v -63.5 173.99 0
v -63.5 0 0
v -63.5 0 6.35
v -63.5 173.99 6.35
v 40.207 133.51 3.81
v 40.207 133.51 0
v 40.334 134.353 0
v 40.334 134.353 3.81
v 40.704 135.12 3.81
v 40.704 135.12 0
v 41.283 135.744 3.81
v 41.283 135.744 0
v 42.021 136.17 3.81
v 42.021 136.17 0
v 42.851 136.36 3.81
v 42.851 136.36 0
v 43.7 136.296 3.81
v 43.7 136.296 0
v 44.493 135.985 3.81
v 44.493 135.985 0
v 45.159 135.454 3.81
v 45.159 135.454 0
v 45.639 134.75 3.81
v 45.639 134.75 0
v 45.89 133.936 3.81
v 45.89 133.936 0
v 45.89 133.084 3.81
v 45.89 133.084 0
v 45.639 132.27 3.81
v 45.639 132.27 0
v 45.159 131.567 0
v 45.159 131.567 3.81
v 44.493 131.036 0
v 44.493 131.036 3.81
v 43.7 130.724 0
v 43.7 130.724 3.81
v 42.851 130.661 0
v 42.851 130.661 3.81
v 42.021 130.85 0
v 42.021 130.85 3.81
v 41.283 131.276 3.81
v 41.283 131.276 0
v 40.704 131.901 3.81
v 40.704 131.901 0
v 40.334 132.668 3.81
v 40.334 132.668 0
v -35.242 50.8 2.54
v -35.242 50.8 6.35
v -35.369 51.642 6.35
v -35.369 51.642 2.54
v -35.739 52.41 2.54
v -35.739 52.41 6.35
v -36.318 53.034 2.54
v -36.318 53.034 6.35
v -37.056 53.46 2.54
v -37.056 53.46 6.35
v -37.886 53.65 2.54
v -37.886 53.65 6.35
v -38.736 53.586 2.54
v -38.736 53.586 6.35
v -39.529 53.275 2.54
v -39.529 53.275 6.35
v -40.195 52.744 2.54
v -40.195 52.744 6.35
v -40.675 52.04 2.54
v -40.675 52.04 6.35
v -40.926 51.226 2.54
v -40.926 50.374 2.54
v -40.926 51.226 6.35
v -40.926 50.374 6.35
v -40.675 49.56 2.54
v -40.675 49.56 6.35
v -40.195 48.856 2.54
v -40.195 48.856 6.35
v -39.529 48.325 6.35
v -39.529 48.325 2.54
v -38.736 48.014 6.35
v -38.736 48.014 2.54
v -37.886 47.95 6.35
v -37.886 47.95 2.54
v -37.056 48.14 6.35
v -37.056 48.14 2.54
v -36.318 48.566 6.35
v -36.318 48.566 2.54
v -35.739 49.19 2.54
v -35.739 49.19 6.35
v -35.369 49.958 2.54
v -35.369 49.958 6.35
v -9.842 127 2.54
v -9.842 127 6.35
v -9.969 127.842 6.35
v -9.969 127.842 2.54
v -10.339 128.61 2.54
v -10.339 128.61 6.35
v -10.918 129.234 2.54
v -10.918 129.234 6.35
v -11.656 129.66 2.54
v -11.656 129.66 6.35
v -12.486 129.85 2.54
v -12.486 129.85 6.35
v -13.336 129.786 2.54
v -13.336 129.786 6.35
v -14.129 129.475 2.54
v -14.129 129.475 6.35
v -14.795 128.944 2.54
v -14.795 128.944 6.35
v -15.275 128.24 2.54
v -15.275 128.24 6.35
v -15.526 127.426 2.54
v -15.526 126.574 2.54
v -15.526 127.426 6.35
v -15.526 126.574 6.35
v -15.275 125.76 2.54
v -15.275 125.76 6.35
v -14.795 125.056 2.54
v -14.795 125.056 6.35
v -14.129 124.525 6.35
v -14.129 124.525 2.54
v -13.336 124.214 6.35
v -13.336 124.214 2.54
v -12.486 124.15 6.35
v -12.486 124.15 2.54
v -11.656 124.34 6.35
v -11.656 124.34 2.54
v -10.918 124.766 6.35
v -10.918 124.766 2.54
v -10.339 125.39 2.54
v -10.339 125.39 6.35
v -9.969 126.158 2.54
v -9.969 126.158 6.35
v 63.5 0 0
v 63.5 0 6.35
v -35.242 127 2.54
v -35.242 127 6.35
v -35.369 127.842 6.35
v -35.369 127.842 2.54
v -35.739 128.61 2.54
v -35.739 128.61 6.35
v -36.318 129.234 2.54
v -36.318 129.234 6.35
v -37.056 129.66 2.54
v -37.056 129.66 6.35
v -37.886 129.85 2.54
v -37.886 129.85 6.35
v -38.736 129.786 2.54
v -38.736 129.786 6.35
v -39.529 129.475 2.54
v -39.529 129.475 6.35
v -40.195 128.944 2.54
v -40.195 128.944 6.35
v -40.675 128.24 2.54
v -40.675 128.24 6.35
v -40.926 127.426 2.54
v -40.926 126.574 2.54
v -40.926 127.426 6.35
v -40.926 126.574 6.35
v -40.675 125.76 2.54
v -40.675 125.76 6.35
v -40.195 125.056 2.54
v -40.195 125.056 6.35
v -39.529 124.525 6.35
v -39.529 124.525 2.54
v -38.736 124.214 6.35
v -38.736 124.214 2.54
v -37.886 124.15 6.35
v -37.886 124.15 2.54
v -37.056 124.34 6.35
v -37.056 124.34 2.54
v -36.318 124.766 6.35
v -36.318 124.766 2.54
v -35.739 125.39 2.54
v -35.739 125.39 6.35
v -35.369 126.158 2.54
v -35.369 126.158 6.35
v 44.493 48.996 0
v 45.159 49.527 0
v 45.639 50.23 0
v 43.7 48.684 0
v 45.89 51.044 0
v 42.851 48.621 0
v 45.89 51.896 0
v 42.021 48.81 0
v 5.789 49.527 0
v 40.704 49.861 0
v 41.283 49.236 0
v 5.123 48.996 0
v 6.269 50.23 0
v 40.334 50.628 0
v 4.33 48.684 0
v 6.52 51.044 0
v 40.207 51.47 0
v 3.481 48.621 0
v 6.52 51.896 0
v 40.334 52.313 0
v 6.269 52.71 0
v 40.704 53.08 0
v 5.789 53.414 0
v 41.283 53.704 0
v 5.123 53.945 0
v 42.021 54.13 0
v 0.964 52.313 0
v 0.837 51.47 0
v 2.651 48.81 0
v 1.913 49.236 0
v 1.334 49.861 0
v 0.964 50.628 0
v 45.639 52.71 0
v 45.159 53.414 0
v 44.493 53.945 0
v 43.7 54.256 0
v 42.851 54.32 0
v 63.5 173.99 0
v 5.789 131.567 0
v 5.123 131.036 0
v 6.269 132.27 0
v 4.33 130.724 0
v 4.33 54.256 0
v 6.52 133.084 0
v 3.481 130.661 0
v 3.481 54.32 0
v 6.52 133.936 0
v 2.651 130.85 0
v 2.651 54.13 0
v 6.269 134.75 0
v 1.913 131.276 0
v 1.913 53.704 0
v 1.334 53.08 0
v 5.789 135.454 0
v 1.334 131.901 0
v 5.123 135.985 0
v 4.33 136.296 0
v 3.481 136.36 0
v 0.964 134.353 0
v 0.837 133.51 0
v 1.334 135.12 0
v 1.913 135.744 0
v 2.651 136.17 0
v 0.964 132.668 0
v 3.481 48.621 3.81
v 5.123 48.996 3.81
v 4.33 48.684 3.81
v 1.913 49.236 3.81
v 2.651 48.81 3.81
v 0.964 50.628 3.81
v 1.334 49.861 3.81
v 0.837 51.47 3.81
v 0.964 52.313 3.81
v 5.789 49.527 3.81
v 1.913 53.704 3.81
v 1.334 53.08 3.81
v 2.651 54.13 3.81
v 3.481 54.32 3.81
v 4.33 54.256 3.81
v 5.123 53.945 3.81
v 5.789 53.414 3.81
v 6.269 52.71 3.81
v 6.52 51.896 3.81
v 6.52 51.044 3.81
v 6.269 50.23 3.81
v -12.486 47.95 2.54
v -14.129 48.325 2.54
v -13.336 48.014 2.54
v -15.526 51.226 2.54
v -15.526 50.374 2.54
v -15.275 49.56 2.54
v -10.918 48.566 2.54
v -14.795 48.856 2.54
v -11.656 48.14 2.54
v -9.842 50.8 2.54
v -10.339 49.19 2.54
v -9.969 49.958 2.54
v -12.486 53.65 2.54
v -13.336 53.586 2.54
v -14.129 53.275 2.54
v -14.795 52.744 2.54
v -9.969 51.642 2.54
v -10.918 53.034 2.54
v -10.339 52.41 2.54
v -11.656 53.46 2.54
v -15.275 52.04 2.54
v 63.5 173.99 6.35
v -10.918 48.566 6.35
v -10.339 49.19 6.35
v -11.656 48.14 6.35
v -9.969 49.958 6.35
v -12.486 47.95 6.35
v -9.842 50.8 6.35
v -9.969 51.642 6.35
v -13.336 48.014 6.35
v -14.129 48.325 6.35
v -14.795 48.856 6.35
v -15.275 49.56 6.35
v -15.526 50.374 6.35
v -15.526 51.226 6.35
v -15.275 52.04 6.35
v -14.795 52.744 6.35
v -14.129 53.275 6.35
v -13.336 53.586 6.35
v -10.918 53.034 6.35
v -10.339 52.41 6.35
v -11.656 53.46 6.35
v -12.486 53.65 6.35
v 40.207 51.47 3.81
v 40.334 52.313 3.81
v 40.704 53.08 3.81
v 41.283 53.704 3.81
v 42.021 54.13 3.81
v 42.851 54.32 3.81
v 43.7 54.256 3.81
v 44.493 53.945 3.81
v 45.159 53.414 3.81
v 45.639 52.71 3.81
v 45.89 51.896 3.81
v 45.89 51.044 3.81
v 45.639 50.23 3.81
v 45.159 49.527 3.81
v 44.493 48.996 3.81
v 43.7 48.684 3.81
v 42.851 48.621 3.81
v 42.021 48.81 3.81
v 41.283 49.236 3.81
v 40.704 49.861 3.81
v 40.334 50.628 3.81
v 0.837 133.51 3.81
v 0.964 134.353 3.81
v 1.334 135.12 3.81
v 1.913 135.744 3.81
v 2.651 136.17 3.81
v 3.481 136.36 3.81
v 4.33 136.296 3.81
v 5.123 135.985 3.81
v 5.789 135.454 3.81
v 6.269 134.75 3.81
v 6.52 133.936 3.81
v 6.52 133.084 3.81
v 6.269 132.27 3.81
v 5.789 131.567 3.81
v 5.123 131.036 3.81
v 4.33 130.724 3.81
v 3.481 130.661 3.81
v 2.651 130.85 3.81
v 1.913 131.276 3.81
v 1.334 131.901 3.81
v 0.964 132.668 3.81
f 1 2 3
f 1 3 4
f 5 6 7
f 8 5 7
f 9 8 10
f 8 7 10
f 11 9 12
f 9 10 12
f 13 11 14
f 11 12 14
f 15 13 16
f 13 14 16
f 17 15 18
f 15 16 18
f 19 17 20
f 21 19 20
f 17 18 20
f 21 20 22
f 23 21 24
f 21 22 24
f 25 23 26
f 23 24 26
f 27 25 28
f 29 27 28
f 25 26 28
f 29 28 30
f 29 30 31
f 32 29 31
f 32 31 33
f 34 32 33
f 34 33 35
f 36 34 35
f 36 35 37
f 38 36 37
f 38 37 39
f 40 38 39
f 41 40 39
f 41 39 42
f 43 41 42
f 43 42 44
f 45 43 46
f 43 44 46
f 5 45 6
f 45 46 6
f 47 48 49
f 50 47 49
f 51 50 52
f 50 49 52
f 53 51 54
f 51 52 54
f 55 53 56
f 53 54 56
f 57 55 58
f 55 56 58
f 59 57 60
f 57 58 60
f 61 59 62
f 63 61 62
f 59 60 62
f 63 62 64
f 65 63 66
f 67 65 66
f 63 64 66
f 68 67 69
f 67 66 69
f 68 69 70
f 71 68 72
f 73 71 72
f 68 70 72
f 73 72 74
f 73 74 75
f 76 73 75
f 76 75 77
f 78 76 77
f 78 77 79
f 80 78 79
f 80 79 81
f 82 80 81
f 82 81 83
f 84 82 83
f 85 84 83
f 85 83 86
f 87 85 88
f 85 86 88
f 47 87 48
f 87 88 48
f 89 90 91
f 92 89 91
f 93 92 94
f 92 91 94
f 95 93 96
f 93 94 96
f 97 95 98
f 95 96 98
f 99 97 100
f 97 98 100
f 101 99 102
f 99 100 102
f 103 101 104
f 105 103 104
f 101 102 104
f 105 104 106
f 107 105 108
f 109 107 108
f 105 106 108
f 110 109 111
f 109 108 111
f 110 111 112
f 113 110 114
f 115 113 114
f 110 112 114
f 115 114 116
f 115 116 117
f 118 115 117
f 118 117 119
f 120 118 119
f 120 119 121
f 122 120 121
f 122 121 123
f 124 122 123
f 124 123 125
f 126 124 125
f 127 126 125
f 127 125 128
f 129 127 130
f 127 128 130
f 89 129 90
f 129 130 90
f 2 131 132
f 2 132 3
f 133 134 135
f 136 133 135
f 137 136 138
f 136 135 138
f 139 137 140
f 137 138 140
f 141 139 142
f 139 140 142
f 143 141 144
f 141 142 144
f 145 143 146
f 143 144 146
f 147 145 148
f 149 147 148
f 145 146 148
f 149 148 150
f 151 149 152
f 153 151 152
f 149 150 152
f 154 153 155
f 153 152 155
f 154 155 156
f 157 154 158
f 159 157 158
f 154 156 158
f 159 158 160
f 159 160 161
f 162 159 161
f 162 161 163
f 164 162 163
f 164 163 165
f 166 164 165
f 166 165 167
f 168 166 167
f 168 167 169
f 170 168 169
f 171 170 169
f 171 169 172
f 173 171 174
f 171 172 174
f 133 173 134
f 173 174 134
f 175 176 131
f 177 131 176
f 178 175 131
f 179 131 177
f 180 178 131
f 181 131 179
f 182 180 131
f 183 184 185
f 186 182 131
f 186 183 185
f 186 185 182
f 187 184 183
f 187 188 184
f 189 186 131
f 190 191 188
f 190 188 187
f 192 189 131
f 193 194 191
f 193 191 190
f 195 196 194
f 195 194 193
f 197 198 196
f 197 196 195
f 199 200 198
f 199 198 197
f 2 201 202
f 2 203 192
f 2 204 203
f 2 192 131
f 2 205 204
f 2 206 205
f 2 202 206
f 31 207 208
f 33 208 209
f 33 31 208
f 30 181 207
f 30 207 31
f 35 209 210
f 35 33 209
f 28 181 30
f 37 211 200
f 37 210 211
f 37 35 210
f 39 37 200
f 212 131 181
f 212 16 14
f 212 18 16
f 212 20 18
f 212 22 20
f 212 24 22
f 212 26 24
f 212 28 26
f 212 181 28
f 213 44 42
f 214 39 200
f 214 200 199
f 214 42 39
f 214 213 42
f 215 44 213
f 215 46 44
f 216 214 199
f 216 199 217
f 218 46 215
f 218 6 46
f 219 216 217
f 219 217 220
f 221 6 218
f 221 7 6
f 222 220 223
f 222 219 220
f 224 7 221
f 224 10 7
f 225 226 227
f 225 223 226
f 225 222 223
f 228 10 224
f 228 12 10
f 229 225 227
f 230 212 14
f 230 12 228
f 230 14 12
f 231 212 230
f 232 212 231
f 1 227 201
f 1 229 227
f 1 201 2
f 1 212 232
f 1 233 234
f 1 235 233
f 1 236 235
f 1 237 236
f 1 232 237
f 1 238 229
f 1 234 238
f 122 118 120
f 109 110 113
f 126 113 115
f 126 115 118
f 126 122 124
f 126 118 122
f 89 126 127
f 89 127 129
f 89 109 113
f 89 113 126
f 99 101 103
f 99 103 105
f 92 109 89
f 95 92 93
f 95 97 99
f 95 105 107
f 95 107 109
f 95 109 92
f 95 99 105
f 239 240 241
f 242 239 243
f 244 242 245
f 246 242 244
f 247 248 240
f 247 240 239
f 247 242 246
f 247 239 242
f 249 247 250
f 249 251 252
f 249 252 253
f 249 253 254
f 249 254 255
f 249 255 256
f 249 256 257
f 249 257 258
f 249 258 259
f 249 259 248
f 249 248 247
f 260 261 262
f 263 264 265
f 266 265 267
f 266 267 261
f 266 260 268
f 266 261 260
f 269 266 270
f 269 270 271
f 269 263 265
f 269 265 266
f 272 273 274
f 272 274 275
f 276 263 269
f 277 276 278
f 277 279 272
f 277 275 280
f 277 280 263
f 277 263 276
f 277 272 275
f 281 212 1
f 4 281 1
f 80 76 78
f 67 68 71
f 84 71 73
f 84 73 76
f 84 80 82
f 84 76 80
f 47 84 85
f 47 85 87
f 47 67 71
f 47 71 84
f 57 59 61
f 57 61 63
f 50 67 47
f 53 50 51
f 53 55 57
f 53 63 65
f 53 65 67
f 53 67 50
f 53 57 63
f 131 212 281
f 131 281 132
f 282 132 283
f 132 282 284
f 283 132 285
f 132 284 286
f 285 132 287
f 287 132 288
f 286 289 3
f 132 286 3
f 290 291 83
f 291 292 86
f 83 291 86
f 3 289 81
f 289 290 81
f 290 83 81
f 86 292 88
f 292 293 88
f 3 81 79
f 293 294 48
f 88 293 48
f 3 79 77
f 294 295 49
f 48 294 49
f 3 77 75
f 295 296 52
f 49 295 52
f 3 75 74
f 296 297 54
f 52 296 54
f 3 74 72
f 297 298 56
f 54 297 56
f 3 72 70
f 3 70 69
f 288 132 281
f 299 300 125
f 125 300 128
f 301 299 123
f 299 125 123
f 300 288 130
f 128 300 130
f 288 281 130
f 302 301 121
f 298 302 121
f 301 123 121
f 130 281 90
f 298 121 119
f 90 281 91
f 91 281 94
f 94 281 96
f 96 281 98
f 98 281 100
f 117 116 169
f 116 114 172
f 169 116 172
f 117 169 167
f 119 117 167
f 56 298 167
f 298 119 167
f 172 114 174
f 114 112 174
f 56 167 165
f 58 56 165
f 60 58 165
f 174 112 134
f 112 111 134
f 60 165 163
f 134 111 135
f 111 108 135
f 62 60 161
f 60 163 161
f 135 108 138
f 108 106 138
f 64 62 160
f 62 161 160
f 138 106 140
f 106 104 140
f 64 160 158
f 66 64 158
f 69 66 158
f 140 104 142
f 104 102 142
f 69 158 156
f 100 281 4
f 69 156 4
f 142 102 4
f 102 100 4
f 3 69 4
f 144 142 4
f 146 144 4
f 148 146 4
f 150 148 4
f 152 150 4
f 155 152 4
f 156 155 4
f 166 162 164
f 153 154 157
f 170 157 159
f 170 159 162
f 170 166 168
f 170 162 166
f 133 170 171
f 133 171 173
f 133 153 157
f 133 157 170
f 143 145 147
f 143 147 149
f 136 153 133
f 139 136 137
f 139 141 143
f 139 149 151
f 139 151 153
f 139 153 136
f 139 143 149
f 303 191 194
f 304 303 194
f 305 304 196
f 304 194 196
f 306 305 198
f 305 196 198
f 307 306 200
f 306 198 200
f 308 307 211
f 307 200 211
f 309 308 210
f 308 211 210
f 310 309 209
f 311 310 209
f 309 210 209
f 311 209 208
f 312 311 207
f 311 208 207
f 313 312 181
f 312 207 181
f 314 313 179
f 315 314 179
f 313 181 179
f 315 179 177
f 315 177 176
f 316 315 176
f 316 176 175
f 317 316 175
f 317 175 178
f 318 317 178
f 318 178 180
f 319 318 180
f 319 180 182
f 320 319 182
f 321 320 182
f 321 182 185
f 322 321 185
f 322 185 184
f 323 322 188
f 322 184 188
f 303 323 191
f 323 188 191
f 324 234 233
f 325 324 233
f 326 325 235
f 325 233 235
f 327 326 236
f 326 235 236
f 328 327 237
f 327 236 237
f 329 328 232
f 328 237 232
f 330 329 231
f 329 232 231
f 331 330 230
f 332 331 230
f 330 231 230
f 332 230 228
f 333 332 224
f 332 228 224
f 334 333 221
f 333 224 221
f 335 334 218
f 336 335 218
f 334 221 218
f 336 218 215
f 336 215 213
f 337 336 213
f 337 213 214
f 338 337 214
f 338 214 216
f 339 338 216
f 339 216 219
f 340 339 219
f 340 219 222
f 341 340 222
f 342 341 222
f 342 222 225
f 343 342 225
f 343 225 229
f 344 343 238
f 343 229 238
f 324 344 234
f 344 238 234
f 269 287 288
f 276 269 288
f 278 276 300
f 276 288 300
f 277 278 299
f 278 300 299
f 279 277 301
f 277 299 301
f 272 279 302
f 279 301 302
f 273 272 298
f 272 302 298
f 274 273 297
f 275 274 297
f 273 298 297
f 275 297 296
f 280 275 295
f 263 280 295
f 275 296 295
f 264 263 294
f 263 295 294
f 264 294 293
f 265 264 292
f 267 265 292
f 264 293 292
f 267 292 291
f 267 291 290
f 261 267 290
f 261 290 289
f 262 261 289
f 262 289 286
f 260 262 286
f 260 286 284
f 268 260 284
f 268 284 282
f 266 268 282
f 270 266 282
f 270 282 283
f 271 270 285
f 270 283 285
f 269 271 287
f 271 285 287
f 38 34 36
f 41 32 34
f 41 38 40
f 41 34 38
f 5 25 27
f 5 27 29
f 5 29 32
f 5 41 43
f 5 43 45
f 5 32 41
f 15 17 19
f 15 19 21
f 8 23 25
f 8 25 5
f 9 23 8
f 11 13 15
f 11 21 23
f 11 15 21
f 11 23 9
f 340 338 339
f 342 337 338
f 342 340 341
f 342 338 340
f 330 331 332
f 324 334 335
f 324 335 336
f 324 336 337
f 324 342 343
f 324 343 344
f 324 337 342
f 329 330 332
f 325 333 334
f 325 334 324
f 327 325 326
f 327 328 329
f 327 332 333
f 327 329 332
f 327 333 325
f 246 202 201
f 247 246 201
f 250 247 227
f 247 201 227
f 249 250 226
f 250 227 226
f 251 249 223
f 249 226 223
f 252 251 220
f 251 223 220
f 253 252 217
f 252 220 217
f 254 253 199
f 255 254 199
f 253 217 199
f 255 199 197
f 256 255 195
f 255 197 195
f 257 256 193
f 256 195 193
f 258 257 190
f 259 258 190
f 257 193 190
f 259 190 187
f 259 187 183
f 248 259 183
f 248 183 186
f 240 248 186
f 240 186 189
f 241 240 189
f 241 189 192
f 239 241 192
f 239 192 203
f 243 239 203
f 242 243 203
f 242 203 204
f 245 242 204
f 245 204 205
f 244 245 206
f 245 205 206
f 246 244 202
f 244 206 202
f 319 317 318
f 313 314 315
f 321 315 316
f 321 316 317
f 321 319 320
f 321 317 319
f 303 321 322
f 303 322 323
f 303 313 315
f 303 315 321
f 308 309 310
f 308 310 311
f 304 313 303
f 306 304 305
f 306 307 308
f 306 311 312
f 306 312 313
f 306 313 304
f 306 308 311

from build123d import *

# Parameters (mm, degrees)
BOSS_EXTRUDE1_DEPTH = 6.35
SKETCH3_R           = 2.8575
CUT_EXTRUDE1_DEPTH  = 3.81
SKETCH2_R           = 2.8575
CUT_EXTRUDE2_DEPTH  = 3.81


with BuildPart() as part:
    # Sketch1 → Boss-Extrude1 (new body)
    with BuildSketch(Plane.XY):
        Polygon((0, 173.99), (63.5, 173.99), (63.5, 0), (-63.5, 0), (-63.5, 173.99), align=None)
    extrude(amount=BOSS_EXTRUDE1_DEPTH)

    # Sketch3 → Cut-Extrude1 (cut)
    with BuildSketch(Plane.XY.offset(6.35)):
        with Locations((-38.1, 127)):
            Circle(SKETCH3_R)
        with Locations((-12.7, 127)):
            Circle(SKETCH3_R)
        with Locations((-38.1, 50.8)):
            Circle(SKETCH3_R)
        with Locations((-12.7, 50.8)):
            Circle(SKETCH3_R)
    extrude(amount=-CUT_EXTRUDE1_DEPTH, mode=Mode.SUBTRACT)

    # Sketch2 → Cut-Extrude2 (cut)
    with BuildSketch(Plane(origin=(0, 0, 0), x_dir=(-1, 0, 0), z_dir=(0, 0, -1))):
        with Locations((-43.064543118, 133.510265263)):
            Circle(SKETCH2_R)
        with Locations((-3.694543118, 133.510265263)):
            Circle(SKETCH2_R)
        with Locations((-43.064543118, 51.470265263)):
            Circle(SKETCH2_R)
        with Locations((-3.694543118, 51.470265263)):
            Circle(SKETCH2_R)
    extrude(amount=-CUT_EXTRUDE2_DEPTH, mode=Mode.SUBTRACT)


solid = part.part
